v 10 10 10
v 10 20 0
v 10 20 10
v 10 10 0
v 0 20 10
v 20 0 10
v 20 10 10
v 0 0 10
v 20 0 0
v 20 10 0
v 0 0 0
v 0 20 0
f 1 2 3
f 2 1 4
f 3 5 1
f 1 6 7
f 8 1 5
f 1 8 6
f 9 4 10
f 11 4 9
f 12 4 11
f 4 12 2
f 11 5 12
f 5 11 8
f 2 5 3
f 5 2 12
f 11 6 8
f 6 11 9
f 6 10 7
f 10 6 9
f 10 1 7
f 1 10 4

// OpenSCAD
union(){
    cube(size=[10, 20, 10]);
    cube(size=[20, 10, 10]);
};
